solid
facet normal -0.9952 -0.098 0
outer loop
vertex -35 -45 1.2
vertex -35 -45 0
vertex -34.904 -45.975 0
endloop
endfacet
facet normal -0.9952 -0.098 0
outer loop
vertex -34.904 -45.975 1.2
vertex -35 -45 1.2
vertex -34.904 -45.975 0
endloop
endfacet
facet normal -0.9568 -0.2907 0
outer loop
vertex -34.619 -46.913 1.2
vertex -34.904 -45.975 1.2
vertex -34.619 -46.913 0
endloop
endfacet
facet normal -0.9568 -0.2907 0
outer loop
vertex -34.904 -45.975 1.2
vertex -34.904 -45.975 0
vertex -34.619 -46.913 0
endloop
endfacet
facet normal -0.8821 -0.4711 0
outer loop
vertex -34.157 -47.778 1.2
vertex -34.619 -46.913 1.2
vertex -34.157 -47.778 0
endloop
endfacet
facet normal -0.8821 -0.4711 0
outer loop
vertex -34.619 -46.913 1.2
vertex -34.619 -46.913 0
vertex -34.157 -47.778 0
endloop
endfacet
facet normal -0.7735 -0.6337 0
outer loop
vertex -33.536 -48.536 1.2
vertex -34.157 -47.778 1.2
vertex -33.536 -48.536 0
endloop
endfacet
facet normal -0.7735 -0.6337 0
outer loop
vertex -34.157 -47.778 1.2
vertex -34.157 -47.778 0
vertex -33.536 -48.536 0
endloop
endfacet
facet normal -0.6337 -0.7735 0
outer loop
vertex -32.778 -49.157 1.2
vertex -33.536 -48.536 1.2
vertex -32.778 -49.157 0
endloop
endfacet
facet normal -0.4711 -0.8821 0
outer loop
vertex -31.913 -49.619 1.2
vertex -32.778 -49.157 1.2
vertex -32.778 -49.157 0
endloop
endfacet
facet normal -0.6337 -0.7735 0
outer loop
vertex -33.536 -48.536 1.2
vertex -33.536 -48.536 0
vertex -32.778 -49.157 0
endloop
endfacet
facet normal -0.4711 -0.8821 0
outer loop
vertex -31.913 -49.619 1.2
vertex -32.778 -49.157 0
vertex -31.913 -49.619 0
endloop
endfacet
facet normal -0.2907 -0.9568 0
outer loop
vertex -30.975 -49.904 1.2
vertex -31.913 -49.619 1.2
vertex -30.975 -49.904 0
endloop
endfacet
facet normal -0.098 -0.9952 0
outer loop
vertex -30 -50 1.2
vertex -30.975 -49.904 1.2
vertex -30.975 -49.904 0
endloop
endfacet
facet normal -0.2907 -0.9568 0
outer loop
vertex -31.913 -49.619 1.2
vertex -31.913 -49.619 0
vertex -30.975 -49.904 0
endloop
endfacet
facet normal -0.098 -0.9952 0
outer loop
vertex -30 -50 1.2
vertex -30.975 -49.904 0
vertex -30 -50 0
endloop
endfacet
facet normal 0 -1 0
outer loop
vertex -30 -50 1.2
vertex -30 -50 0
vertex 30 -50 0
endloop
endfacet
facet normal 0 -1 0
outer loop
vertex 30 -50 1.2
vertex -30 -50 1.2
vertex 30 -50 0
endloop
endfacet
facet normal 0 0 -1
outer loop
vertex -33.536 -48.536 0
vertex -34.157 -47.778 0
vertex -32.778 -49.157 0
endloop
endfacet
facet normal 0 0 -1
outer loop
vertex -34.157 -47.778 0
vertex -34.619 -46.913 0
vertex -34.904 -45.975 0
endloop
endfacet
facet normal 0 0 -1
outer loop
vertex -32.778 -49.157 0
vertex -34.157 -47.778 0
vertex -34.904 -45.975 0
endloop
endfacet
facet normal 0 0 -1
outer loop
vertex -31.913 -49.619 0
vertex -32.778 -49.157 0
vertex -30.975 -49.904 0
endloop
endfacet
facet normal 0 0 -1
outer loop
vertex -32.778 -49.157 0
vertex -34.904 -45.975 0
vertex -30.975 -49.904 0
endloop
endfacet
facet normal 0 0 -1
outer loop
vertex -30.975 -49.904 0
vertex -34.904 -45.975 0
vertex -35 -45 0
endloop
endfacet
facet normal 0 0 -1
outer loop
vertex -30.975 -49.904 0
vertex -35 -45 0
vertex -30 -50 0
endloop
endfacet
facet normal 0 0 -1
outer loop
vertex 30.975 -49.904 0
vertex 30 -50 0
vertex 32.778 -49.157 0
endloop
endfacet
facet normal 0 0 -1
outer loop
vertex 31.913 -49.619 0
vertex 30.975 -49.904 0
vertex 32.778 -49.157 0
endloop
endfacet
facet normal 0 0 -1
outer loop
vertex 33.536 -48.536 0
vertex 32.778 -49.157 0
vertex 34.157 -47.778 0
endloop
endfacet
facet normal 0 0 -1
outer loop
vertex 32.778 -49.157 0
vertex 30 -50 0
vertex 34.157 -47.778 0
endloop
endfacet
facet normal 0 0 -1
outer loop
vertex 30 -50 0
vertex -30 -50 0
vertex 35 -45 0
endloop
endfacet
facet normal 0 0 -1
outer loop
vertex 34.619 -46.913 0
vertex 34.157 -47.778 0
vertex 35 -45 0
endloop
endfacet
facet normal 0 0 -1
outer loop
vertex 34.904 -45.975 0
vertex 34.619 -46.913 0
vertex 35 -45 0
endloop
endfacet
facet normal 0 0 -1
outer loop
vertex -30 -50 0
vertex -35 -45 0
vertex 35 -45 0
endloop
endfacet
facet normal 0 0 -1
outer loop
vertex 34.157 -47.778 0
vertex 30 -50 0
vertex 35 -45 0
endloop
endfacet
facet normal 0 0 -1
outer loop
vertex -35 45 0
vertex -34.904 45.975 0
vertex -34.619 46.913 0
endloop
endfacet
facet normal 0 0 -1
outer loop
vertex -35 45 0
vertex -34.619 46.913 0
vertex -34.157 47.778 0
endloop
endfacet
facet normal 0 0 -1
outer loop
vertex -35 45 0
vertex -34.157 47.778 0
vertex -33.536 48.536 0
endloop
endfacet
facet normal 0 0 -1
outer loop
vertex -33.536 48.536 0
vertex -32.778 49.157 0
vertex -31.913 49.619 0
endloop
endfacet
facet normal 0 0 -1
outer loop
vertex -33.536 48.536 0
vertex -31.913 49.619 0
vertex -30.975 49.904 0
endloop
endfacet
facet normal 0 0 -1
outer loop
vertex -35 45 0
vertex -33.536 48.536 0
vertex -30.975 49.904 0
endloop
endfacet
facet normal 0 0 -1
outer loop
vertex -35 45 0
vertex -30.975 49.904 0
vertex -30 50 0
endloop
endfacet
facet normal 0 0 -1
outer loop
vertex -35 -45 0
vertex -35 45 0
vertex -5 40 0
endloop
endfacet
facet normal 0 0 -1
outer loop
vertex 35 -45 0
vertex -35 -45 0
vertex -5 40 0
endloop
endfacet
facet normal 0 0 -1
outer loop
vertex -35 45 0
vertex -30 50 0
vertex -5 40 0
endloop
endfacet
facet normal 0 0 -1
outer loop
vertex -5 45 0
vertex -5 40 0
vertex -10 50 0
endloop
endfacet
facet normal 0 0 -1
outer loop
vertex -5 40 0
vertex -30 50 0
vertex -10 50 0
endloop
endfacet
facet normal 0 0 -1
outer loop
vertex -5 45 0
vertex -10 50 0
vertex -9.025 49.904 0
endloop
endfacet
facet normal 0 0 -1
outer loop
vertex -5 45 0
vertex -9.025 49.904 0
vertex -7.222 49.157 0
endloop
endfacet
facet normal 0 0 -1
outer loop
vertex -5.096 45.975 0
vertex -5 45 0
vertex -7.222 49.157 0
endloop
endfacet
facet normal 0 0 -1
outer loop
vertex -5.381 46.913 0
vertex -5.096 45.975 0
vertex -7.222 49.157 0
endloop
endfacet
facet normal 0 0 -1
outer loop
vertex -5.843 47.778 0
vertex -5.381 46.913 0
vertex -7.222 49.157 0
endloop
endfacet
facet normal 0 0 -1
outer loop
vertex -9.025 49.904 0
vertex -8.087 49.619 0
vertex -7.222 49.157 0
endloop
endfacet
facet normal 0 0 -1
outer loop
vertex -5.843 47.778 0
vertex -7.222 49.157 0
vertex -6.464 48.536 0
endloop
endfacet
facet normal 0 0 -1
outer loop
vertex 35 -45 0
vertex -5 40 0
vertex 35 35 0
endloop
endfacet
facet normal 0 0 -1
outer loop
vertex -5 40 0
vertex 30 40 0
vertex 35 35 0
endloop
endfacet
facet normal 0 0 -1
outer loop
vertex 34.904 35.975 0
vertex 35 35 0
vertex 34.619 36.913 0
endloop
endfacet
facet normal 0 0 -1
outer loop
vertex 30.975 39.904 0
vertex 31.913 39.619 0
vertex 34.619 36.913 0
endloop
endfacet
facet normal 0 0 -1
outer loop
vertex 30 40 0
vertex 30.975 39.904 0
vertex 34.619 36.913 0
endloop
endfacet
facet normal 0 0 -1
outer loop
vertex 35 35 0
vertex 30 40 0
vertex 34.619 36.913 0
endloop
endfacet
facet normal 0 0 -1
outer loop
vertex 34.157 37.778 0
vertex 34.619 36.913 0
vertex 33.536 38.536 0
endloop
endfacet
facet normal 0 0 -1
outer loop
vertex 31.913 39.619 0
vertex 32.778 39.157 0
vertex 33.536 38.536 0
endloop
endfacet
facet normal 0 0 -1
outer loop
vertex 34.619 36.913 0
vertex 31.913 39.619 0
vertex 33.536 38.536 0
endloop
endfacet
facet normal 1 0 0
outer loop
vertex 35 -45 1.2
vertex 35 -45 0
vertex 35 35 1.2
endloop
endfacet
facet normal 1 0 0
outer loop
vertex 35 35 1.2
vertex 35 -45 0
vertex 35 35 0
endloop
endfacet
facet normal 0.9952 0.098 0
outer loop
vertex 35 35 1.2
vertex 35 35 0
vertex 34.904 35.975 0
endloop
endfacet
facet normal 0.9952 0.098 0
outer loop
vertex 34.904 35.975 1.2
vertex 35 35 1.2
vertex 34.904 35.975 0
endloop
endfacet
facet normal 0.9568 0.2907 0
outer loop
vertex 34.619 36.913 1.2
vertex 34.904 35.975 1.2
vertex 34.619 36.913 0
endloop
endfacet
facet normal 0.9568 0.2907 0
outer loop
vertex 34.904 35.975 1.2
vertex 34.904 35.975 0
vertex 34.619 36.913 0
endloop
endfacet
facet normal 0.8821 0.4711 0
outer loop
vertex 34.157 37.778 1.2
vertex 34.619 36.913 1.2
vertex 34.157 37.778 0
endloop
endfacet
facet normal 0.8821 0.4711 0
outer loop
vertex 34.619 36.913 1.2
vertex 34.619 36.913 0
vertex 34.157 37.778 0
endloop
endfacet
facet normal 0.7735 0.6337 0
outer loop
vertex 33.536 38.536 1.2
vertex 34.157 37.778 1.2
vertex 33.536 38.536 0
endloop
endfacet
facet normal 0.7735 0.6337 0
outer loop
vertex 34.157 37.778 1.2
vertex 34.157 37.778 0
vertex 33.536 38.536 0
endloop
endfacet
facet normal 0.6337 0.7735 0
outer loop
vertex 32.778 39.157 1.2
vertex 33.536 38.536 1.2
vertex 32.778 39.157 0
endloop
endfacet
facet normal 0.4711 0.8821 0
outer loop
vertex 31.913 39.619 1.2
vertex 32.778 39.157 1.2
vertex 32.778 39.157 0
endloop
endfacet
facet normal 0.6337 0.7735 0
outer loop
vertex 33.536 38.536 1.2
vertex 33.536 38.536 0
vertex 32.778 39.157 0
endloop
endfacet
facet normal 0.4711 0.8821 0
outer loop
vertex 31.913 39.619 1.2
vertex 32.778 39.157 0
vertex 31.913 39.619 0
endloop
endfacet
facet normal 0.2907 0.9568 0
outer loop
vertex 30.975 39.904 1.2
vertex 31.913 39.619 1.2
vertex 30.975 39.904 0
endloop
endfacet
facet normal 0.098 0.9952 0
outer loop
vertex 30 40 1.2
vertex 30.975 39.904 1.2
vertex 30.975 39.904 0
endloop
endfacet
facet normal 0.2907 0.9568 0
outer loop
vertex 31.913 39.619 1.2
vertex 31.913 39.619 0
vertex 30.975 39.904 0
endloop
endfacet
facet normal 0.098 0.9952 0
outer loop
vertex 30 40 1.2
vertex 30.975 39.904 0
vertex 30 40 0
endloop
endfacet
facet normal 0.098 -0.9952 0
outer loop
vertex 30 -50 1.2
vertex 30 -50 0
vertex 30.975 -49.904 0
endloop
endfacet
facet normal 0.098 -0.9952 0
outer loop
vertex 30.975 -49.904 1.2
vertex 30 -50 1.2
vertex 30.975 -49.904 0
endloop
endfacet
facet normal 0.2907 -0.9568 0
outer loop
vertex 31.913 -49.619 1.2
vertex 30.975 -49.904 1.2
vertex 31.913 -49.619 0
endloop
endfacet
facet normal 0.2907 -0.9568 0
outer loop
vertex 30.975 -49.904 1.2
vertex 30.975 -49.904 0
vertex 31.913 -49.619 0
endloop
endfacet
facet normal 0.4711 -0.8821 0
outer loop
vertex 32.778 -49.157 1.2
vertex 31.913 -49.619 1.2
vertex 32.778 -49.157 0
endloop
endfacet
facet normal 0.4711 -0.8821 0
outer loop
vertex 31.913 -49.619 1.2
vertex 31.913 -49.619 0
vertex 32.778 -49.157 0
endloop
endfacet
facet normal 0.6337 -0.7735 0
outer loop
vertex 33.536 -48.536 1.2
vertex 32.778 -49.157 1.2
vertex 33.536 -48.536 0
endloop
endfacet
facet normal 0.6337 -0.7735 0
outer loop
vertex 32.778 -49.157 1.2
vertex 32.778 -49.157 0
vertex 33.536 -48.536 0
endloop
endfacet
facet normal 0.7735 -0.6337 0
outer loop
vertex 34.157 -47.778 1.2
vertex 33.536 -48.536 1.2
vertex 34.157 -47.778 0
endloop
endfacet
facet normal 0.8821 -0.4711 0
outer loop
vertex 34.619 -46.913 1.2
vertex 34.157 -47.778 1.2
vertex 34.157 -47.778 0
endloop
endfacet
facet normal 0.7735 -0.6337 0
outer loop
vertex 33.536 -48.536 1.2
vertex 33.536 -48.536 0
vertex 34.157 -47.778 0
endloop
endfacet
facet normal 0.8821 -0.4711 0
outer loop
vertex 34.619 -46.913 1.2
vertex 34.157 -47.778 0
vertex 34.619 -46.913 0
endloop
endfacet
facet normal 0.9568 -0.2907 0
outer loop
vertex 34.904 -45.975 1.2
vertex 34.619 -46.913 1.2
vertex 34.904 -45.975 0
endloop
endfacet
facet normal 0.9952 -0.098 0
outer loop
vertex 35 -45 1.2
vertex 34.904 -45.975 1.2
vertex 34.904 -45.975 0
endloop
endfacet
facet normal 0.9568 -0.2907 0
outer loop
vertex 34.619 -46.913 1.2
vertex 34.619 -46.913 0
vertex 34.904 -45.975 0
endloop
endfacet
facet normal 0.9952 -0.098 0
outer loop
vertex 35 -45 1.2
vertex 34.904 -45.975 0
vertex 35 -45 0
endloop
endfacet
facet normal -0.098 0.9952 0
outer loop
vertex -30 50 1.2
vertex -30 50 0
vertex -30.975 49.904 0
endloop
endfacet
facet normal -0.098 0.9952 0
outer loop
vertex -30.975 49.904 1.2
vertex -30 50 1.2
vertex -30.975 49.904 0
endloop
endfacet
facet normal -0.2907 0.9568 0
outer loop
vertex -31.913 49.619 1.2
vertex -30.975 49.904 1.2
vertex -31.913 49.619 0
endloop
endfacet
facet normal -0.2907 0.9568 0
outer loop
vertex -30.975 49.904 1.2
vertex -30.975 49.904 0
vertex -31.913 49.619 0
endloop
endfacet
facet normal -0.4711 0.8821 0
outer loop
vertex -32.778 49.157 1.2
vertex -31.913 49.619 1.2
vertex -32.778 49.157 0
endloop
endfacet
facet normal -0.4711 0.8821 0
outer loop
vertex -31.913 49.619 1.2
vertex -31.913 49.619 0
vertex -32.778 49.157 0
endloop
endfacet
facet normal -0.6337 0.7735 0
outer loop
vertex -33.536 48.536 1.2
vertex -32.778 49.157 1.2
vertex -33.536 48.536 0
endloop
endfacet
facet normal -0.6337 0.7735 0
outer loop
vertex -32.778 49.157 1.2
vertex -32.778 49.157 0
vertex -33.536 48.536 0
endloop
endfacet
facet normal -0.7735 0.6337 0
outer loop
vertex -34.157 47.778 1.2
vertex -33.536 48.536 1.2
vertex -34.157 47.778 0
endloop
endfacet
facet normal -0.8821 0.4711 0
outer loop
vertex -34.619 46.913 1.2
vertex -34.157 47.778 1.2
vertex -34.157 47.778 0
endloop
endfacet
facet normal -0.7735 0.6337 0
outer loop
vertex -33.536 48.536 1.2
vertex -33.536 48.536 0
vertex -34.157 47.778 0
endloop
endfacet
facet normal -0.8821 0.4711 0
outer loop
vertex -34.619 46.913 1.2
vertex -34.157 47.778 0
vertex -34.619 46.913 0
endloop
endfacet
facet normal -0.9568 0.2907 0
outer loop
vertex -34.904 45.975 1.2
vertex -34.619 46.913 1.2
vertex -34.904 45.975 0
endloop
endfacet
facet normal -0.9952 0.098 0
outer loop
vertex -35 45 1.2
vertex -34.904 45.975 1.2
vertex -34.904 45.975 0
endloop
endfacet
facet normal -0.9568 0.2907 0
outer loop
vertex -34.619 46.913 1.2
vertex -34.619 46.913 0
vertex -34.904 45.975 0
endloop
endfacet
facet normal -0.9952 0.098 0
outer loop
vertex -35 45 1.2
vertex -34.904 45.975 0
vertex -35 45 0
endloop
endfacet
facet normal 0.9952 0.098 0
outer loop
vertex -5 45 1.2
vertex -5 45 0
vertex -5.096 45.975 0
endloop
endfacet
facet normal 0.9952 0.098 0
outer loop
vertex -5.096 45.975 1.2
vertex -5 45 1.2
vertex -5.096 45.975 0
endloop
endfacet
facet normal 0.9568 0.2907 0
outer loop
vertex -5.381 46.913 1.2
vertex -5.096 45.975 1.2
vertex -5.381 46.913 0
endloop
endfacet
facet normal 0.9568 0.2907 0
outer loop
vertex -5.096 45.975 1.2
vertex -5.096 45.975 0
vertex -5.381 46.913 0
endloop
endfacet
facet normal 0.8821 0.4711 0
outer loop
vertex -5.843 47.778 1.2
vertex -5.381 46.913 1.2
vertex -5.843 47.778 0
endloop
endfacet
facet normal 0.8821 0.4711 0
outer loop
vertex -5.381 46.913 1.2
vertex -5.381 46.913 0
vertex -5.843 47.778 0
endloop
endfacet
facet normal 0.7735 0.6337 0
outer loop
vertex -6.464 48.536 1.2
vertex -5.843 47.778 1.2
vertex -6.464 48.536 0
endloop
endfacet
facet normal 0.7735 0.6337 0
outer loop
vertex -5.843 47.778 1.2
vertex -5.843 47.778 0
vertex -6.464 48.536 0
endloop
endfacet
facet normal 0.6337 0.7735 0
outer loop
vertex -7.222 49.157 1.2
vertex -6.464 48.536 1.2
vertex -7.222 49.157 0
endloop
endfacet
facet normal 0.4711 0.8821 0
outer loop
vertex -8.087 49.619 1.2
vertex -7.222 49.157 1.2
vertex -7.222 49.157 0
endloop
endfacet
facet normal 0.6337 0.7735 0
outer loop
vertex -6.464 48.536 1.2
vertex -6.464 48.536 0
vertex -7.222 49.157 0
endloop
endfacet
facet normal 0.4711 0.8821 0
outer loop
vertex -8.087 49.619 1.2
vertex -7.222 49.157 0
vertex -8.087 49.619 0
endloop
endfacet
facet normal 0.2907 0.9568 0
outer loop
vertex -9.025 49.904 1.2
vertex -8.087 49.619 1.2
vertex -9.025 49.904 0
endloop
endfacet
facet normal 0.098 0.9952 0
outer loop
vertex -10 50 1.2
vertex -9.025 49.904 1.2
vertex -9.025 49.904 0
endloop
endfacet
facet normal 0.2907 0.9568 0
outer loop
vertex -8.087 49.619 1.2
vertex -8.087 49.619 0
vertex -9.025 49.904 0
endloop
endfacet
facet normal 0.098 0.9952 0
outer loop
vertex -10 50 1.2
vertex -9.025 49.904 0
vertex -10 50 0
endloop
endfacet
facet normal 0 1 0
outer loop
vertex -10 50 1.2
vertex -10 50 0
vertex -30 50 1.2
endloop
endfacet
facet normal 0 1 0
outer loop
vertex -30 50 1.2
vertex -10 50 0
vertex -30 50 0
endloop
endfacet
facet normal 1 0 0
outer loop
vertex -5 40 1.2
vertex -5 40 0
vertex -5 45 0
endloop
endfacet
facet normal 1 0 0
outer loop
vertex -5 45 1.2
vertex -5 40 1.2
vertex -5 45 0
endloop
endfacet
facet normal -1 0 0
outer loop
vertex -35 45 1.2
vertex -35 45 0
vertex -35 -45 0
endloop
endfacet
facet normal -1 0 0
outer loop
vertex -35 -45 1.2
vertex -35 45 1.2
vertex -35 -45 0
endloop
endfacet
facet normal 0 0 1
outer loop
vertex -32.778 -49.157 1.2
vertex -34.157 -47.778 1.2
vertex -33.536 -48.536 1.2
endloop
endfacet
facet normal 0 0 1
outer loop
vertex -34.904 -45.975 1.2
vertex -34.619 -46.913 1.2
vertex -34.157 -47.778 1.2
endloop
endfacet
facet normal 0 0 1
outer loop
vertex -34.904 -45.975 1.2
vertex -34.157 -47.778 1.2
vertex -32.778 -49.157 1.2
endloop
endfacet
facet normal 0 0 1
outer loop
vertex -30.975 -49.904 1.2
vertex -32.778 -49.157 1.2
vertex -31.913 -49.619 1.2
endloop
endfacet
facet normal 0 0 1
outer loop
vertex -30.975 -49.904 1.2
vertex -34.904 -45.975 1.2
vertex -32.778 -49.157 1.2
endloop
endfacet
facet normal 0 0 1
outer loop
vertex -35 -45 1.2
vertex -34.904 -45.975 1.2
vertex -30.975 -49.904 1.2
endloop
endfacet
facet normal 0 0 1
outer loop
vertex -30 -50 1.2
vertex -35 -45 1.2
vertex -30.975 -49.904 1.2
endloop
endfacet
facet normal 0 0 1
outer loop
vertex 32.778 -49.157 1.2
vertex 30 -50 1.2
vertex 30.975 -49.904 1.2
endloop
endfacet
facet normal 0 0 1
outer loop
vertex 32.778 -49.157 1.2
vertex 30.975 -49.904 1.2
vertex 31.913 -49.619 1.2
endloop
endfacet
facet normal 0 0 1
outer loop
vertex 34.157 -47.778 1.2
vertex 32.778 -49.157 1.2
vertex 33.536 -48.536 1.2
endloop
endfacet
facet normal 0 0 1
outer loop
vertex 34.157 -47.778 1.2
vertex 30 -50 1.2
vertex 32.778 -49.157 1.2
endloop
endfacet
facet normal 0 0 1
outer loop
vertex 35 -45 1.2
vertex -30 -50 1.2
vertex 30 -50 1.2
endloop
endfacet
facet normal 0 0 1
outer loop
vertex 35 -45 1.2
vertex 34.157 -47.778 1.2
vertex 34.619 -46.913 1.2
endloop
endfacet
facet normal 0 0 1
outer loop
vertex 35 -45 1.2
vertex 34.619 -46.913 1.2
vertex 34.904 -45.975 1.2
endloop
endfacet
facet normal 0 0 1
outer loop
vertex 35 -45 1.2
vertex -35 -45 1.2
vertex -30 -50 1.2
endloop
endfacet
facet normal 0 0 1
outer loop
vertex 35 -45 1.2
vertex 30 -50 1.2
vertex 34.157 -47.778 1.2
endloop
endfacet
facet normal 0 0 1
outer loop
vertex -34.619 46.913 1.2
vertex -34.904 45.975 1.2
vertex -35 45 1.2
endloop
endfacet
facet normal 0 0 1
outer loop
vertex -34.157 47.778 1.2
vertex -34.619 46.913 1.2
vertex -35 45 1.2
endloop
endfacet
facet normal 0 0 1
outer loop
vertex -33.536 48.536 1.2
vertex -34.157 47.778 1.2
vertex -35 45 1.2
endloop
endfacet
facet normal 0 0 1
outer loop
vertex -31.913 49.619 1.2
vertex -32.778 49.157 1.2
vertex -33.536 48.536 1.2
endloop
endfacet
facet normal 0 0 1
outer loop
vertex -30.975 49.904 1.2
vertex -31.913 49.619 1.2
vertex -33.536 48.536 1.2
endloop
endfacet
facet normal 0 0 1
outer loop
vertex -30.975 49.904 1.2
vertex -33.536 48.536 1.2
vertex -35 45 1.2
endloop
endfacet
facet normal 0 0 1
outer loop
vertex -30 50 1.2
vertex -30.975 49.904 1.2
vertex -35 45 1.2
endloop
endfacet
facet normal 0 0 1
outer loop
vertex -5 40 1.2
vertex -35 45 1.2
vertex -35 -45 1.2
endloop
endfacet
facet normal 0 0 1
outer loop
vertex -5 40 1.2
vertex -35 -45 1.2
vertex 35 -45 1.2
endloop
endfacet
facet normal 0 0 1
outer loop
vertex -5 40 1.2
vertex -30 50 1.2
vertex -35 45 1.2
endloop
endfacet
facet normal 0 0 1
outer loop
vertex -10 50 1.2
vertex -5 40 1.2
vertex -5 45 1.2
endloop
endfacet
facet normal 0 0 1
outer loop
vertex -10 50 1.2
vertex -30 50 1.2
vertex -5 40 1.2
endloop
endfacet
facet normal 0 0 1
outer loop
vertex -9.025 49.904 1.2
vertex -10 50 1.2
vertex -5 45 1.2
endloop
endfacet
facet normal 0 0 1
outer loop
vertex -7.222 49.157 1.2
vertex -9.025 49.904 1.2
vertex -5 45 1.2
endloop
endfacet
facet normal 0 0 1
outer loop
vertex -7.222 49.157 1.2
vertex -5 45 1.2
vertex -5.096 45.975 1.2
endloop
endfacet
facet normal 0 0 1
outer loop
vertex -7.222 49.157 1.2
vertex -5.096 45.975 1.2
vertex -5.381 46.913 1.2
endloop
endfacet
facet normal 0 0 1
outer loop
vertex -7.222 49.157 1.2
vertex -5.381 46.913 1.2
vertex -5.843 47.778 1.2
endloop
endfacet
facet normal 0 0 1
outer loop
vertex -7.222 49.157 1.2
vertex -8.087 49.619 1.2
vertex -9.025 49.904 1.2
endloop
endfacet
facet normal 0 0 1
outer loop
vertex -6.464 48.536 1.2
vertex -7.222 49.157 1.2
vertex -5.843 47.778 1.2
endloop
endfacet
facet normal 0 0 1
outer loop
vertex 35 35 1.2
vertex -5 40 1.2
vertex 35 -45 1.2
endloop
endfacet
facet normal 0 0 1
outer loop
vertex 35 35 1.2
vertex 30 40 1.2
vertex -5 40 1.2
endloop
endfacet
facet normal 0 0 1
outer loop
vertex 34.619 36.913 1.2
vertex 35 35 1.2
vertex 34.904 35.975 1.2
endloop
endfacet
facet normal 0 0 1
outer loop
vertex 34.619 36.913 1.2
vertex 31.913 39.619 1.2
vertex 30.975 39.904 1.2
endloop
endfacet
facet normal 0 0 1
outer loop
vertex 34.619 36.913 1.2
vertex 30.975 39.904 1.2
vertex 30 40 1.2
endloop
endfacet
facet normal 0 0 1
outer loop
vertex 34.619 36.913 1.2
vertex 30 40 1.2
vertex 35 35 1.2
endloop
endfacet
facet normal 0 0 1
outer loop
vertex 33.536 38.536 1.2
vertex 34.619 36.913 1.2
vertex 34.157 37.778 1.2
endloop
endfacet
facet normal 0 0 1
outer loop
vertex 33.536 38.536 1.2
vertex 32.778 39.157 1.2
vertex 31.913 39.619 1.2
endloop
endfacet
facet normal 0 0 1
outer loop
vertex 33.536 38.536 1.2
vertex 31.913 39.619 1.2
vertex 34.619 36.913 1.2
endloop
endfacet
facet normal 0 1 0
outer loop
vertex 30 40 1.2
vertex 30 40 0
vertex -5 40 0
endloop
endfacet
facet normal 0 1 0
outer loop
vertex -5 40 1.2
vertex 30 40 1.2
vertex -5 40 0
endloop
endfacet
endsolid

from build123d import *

# Parameters (mm, degrees)
F1_DEPTH = 1.2


with BuildPart() as f1:
    # F0 (on Top) → F1 (new body)
    with BuildSketch(Plane.XY):
        with BuildLine():
            Line((-30, -50), (30, -50))
            ThreePointArc((30, -50), (33.535534, -48.535534), (35, -45))
            Line((35, -45), (35, 35))
            ThreePointArc((35, 35), (33.535534, 38.535534), (30, 40))
            Line((30, 40), (-5, 40))
            Line((-5, 40), (-5, 45))
            ThreePointArc((-5, 45), (-6.464466, 48.535534), (-10, 50))
            Line((-10, 50), (-30, 50))
            ThreePointArc((-30, 50), (-33.535534, 48.535534), (-35, 45))
            Line((-35, 45), (-35, -45))
            ThreePointArc((-35, -45), (-33.535534, -48.535534), (-30, -50))
        make_face()
    extrude(amount=F1_DEPTH)


solid = f1.part
